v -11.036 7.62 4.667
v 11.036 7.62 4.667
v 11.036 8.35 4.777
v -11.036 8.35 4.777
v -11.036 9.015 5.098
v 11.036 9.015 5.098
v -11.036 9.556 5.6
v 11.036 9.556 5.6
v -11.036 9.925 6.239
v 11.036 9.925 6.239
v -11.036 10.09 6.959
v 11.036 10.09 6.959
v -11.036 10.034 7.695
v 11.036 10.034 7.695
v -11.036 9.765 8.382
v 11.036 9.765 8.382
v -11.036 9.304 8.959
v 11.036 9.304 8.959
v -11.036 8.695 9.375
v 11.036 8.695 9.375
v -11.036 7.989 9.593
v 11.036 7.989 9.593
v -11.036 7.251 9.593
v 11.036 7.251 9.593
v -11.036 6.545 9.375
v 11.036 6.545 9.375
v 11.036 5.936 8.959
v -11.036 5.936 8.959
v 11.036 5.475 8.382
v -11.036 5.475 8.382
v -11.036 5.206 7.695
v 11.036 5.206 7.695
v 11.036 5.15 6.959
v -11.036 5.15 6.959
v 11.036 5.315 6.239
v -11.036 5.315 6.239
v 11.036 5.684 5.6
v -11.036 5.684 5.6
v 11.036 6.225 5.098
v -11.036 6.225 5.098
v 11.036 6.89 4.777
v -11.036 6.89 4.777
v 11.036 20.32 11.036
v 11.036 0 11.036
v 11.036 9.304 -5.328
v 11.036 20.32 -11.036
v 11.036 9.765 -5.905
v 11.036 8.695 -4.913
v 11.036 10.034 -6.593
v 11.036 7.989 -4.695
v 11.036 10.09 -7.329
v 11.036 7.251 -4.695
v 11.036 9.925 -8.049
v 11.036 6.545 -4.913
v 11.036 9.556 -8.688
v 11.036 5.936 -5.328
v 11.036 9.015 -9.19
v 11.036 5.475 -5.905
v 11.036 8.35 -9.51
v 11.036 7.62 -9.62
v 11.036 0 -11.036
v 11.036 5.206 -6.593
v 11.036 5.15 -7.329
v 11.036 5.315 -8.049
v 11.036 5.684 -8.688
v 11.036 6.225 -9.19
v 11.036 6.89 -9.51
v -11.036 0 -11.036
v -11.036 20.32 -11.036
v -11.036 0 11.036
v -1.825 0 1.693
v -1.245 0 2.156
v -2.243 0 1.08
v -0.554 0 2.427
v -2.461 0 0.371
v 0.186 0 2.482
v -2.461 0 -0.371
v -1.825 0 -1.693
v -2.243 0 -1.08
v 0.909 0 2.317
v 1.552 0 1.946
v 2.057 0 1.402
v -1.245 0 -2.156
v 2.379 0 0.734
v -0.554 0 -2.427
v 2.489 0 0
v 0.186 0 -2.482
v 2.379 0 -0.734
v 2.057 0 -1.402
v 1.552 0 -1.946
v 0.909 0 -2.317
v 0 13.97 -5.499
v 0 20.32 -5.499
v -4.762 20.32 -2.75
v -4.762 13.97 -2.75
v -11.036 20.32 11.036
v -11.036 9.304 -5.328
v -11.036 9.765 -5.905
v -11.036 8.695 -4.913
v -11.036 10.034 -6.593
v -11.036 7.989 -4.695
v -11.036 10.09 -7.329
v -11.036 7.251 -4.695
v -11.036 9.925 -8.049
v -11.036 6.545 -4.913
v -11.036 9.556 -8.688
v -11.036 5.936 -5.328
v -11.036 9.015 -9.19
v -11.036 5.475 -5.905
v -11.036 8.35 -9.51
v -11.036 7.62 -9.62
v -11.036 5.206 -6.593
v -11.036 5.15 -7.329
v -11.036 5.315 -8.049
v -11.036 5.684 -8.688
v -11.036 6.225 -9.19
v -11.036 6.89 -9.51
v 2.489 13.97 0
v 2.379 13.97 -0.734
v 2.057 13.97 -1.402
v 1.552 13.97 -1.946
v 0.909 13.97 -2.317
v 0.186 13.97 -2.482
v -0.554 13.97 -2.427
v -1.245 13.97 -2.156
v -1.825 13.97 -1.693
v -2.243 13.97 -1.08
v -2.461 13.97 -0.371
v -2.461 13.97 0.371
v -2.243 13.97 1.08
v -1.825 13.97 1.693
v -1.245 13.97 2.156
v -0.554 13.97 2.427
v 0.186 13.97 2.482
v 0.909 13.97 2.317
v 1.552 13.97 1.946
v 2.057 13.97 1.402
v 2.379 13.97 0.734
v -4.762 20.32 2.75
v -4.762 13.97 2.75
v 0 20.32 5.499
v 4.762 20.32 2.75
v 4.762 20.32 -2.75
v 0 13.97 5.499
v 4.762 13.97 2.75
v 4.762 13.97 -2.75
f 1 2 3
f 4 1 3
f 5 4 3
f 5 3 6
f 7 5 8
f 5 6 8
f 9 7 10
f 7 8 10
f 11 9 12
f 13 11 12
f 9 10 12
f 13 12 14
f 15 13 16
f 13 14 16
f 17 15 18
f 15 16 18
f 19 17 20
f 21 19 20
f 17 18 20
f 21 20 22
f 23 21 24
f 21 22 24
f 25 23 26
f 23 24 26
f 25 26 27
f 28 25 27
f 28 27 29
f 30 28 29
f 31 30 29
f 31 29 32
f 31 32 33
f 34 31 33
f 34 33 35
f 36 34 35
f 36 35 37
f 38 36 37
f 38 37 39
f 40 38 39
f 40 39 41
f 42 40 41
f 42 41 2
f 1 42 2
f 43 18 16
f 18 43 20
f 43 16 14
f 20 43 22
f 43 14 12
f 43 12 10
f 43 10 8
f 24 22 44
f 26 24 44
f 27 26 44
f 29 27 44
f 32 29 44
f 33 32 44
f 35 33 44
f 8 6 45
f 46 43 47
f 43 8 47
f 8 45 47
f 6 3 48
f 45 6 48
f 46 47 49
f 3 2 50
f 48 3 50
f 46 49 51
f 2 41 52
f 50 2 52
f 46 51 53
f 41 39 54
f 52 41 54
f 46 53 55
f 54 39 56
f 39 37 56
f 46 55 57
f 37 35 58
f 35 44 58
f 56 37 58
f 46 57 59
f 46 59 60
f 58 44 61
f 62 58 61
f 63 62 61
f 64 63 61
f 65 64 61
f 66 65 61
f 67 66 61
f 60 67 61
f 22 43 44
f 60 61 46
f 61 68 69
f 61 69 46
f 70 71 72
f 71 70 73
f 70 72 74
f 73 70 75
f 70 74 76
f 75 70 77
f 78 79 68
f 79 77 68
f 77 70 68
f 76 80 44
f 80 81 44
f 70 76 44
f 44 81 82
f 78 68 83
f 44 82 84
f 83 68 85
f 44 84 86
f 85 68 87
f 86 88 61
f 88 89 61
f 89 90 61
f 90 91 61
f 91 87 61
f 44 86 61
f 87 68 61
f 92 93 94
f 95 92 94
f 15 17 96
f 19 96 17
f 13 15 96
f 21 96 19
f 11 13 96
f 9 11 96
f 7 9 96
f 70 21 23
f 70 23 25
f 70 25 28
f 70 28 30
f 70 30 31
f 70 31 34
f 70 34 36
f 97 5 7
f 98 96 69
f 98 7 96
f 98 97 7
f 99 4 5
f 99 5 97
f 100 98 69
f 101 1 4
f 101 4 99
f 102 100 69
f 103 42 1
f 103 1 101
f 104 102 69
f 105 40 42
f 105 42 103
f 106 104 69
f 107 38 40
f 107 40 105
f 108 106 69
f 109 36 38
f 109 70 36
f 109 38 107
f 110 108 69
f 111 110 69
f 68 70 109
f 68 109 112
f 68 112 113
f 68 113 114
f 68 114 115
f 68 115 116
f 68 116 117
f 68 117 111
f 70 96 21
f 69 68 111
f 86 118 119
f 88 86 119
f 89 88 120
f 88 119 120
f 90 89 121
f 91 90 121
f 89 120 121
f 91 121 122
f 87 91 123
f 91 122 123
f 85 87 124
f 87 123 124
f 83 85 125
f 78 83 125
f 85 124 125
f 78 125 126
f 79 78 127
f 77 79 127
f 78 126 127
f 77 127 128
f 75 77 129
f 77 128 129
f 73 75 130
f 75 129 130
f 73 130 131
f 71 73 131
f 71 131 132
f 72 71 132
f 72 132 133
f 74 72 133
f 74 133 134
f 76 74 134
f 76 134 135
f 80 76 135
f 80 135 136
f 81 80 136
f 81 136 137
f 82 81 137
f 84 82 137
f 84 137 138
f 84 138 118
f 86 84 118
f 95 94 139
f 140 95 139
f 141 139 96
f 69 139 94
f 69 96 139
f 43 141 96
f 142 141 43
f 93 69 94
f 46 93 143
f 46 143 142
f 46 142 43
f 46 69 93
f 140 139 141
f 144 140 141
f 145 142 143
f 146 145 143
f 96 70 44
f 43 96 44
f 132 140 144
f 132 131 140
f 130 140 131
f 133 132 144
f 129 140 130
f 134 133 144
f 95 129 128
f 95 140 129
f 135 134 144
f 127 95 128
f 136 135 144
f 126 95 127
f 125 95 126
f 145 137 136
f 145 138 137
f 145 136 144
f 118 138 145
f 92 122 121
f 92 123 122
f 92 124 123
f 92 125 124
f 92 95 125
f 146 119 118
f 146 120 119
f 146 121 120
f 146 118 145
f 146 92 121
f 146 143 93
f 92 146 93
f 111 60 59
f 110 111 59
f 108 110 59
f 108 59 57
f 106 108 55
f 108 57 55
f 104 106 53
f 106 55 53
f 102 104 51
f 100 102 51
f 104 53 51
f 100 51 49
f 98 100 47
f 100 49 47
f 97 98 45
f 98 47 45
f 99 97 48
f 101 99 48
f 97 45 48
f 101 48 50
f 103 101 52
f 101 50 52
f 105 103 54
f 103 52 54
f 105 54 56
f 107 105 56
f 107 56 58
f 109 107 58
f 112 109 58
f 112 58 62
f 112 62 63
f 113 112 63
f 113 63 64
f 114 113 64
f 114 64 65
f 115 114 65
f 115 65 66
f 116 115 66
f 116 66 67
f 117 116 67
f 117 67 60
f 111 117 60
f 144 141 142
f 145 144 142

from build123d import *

# Parameters (mm, degrees)
SKETCH1_W              = 22.0726
SKETCH1_H              = 22.0726
BOSS_EXTRUDE1_DEPTH    = 20.32
F_10_CLEARANCE_HOLE1_D = 4.9784
SKETCH8_R              = 2.4765
CUT_EXTRUDE1_DEPTH     = 32.967201761
CUT_EXTRUDE2_DEPTH     = 6.35


with BuildPart() as part:
    # Sketch1 → Boss-Extrude1 (new body)
    with BuildSketch(Plane(origin=(0, 0, 0), x_dir=(1, 0, 0), z_dir=(0, 1, 0))):
        Rectangle(SKETCH1_W, SKETCH1_H)
    extrude(amount=BOSS_EXTRUDE1_DEPTH)

    # #10 Clearance Hole1 (through all)
    with Locations(Plane(origin=(0, 0, 0), x_dir=(-1, 0, 0), z_dir=(0, -1, 0))):
        with Locations((0, 0)):
            Hole(F_10_CLEARANCE_HOLE1_D / 2)

    # Sketch8 → Cut-Extrude1 (cut, through all)
    with BuildSketch(Plane(origin=(11.0363, 0, 0), x_dir=(0, 0, -1), z_dir=(1, 0, 0))):
        with Locations((-7.14375, 7.62)):
            Circle(SKETCH8_R)
        with Locations((7.14375, 7.62)):
            Circle(SKETCH8_R)
    extrude(amount=-CUT_EXTRUDE1_DEPTH, mode=Mode.SUBTRACT)

    # Sketch9 → Cut-Extrude2 (cut)
    with BuildSketch(Plane(origin=(0, 20.32, 0), x_dir=(1, 0, 0), z_dir=(0, 1, 0))):
        Polygon((0, 5.499261314), (-4.7625, 2.749630657), (-4.7625, -2.749630657), (0, -5.499261314), (4.7625, -2.749630657), (4.7625, 2.749630657), align=None)
    extrude(amount=-CUT_EXTRUDE2_DEPTH, mode=Mode.SUBTRACT)


solid = part.part
